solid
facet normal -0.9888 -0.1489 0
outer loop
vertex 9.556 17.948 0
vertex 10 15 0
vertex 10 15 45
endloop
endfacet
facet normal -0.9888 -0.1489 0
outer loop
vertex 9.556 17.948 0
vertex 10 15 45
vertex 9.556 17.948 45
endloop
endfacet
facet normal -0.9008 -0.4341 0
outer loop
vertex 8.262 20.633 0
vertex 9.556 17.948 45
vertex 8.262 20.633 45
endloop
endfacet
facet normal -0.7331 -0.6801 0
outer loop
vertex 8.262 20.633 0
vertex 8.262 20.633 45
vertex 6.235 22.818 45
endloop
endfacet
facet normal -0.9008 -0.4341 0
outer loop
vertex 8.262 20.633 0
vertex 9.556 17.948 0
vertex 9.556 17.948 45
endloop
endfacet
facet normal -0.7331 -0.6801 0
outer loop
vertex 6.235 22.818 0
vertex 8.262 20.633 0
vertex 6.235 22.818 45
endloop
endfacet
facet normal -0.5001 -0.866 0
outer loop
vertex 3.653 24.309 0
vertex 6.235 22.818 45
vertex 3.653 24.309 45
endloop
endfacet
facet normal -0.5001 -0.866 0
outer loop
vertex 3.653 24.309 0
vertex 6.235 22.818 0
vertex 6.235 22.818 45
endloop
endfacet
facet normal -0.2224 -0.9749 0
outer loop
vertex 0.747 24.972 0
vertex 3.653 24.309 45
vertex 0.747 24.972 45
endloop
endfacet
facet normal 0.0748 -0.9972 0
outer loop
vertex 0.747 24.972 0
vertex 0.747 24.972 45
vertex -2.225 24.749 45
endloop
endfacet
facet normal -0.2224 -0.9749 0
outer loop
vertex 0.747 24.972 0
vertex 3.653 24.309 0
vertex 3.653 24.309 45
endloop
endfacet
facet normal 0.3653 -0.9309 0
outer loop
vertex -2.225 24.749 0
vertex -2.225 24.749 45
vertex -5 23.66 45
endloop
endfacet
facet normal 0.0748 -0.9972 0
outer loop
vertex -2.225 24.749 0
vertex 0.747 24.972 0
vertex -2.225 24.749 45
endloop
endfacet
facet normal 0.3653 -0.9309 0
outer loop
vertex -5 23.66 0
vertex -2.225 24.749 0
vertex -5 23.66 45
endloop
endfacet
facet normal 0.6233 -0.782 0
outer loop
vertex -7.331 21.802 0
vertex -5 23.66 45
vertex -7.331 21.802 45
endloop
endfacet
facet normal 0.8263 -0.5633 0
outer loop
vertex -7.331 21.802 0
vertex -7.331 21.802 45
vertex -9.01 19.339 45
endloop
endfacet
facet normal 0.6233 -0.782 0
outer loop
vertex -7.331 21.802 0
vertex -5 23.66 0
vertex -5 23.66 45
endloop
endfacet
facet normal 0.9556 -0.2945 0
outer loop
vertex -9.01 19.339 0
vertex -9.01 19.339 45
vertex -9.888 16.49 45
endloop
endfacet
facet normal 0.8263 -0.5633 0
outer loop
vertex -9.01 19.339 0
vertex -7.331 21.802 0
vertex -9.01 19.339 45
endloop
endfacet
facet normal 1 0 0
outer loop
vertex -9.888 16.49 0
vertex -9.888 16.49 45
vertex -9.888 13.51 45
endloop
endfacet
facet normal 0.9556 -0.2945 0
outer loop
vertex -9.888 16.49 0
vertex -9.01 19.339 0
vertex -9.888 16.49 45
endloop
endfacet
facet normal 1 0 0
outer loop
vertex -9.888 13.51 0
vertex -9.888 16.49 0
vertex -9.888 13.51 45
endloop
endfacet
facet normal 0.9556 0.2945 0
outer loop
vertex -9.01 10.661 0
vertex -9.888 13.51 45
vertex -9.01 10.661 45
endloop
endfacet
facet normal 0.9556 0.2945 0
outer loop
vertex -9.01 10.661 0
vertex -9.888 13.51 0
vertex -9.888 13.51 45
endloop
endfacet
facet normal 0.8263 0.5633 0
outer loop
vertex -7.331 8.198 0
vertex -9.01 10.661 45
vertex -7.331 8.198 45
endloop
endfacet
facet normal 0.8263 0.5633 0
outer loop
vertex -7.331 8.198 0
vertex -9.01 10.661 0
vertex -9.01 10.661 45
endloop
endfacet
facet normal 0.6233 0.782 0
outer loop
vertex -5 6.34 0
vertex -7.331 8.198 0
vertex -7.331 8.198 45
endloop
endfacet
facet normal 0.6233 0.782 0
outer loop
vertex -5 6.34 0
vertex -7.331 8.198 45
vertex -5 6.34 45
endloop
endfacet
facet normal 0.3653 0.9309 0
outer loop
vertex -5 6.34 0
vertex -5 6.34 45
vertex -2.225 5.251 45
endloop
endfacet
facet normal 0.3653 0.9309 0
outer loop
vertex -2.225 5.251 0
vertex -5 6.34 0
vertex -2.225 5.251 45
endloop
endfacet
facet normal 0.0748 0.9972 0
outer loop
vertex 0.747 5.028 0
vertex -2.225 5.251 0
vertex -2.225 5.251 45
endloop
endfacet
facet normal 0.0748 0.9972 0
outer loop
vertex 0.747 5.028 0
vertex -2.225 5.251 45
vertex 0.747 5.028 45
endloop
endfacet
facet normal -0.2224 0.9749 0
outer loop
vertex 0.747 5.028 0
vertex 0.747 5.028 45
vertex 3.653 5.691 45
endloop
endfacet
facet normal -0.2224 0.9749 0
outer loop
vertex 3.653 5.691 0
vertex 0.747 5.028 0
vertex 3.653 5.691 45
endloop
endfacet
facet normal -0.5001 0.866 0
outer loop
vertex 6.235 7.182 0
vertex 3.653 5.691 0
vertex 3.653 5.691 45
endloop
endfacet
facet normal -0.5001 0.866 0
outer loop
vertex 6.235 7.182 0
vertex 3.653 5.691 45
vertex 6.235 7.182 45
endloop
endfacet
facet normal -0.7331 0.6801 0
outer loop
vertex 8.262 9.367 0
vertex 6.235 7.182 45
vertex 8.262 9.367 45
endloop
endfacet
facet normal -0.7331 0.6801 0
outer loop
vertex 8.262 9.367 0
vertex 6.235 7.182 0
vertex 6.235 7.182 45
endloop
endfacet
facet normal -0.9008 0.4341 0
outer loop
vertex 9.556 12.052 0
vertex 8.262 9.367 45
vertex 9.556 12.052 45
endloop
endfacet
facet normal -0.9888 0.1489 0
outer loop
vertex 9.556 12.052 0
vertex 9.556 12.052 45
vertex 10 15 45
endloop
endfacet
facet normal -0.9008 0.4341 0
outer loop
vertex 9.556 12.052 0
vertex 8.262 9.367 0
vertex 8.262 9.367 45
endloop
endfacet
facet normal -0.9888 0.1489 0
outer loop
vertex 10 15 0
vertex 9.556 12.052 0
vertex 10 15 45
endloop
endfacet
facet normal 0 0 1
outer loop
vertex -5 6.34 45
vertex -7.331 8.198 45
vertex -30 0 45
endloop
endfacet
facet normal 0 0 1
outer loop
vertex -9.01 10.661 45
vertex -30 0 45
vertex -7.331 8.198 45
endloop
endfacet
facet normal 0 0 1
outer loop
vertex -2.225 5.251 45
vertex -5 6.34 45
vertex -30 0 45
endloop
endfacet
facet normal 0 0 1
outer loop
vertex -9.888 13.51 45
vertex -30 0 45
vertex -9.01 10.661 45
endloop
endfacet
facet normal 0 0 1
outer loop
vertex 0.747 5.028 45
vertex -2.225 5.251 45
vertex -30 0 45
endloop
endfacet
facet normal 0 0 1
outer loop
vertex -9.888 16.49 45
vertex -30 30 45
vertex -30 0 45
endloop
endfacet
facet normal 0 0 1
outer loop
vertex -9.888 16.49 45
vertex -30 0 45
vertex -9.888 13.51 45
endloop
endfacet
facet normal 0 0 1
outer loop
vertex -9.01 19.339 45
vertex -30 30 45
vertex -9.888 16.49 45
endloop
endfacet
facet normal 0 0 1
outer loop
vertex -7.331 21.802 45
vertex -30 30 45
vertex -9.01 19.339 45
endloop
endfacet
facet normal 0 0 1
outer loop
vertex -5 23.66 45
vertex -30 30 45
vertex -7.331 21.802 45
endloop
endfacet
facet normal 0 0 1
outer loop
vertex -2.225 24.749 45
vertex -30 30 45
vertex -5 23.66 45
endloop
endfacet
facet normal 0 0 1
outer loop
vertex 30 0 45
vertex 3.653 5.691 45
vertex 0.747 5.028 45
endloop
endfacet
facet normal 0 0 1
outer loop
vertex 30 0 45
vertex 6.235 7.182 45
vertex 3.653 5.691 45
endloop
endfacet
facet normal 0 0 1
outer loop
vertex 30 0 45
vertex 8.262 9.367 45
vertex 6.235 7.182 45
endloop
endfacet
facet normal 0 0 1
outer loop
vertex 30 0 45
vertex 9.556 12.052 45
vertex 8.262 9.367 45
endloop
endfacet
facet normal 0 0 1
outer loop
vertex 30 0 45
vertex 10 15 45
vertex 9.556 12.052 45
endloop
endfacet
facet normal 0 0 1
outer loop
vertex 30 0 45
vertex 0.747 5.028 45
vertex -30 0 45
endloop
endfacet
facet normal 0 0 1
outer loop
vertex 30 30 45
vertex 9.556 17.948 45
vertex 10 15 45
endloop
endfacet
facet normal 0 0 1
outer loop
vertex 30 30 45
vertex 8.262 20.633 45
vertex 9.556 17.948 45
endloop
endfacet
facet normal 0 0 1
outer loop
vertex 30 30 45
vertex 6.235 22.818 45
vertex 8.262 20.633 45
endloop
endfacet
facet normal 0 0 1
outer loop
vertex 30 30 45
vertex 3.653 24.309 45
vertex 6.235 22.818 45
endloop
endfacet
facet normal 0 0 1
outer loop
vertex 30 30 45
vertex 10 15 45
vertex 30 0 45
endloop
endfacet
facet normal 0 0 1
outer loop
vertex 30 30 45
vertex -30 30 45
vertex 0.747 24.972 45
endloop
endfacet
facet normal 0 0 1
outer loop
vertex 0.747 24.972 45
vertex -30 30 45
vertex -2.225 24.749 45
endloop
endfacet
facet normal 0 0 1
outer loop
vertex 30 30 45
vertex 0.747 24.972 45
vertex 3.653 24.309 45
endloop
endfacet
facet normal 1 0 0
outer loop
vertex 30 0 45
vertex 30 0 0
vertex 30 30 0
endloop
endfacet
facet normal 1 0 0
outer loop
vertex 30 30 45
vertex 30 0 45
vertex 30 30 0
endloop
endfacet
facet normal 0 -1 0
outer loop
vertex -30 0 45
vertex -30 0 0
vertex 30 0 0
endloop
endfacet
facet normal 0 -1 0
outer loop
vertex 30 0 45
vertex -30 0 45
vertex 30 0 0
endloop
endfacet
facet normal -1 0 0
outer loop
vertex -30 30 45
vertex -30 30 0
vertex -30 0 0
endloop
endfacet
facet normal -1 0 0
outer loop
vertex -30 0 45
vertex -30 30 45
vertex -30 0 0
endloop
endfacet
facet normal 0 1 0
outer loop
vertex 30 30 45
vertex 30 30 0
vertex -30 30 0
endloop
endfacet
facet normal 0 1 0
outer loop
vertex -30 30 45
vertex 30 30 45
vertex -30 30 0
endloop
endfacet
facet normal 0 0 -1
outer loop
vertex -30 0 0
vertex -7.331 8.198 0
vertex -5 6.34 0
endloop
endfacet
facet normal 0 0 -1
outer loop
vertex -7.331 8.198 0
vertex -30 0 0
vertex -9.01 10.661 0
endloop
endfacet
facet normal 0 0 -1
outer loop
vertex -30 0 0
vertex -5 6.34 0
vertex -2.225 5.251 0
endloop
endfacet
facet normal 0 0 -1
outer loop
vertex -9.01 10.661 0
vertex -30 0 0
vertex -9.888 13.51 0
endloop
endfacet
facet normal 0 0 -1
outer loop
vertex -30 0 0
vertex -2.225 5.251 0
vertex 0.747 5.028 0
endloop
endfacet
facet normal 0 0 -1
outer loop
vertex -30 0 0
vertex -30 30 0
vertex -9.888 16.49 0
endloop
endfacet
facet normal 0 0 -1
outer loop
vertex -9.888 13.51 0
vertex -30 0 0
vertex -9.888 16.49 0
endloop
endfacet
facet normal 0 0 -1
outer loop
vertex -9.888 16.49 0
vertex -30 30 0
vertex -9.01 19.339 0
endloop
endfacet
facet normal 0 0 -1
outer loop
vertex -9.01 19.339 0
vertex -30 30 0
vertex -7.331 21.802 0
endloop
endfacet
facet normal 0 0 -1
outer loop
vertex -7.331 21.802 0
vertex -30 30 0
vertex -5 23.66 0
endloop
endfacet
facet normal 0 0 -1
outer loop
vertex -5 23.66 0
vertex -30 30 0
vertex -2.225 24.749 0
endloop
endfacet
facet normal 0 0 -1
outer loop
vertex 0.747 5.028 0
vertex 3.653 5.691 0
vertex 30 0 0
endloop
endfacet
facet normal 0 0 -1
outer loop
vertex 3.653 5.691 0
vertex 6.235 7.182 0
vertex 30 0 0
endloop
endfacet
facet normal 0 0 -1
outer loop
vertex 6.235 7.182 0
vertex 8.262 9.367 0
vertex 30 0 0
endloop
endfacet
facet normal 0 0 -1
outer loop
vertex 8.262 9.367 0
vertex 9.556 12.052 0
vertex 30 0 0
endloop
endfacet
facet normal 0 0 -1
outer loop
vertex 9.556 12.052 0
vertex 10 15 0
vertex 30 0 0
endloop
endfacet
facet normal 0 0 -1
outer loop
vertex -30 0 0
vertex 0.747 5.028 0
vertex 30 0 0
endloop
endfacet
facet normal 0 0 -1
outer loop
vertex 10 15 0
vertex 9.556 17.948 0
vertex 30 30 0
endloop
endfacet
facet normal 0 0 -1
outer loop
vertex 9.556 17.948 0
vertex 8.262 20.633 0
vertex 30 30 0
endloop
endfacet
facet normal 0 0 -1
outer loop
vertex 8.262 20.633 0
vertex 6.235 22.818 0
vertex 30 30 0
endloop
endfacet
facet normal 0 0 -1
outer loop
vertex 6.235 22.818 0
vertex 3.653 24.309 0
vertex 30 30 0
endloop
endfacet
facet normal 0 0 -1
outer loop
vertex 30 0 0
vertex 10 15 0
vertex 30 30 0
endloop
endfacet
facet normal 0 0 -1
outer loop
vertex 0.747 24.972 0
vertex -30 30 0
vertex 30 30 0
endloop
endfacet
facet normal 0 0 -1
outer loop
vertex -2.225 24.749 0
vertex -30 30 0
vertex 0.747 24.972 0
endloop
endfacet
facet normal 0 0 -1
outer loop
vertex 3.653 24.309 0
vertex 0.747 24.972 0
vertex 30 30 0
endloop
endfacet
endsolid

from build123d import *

# Parameters (mm, degrees)
F0_R     = 10
F1_DEPTH = 45


with BuildPart() as f1:
    # F0 (on Top) → F1 (new body)
    with BuildSketch(Plane.XY):
        Polygon((12.5, 30), (-12.5, 30), (-30, 30), (-30, 0), (-12.5, 0), (12.5, 0), (30, 0), (30, 30), align=None)
        with Locations((0, 15)):
            Circle(F0_R, mode=Mode.SUBTRACT)
    extrude(amount=F1_DEPTH)


solid = f1.part
